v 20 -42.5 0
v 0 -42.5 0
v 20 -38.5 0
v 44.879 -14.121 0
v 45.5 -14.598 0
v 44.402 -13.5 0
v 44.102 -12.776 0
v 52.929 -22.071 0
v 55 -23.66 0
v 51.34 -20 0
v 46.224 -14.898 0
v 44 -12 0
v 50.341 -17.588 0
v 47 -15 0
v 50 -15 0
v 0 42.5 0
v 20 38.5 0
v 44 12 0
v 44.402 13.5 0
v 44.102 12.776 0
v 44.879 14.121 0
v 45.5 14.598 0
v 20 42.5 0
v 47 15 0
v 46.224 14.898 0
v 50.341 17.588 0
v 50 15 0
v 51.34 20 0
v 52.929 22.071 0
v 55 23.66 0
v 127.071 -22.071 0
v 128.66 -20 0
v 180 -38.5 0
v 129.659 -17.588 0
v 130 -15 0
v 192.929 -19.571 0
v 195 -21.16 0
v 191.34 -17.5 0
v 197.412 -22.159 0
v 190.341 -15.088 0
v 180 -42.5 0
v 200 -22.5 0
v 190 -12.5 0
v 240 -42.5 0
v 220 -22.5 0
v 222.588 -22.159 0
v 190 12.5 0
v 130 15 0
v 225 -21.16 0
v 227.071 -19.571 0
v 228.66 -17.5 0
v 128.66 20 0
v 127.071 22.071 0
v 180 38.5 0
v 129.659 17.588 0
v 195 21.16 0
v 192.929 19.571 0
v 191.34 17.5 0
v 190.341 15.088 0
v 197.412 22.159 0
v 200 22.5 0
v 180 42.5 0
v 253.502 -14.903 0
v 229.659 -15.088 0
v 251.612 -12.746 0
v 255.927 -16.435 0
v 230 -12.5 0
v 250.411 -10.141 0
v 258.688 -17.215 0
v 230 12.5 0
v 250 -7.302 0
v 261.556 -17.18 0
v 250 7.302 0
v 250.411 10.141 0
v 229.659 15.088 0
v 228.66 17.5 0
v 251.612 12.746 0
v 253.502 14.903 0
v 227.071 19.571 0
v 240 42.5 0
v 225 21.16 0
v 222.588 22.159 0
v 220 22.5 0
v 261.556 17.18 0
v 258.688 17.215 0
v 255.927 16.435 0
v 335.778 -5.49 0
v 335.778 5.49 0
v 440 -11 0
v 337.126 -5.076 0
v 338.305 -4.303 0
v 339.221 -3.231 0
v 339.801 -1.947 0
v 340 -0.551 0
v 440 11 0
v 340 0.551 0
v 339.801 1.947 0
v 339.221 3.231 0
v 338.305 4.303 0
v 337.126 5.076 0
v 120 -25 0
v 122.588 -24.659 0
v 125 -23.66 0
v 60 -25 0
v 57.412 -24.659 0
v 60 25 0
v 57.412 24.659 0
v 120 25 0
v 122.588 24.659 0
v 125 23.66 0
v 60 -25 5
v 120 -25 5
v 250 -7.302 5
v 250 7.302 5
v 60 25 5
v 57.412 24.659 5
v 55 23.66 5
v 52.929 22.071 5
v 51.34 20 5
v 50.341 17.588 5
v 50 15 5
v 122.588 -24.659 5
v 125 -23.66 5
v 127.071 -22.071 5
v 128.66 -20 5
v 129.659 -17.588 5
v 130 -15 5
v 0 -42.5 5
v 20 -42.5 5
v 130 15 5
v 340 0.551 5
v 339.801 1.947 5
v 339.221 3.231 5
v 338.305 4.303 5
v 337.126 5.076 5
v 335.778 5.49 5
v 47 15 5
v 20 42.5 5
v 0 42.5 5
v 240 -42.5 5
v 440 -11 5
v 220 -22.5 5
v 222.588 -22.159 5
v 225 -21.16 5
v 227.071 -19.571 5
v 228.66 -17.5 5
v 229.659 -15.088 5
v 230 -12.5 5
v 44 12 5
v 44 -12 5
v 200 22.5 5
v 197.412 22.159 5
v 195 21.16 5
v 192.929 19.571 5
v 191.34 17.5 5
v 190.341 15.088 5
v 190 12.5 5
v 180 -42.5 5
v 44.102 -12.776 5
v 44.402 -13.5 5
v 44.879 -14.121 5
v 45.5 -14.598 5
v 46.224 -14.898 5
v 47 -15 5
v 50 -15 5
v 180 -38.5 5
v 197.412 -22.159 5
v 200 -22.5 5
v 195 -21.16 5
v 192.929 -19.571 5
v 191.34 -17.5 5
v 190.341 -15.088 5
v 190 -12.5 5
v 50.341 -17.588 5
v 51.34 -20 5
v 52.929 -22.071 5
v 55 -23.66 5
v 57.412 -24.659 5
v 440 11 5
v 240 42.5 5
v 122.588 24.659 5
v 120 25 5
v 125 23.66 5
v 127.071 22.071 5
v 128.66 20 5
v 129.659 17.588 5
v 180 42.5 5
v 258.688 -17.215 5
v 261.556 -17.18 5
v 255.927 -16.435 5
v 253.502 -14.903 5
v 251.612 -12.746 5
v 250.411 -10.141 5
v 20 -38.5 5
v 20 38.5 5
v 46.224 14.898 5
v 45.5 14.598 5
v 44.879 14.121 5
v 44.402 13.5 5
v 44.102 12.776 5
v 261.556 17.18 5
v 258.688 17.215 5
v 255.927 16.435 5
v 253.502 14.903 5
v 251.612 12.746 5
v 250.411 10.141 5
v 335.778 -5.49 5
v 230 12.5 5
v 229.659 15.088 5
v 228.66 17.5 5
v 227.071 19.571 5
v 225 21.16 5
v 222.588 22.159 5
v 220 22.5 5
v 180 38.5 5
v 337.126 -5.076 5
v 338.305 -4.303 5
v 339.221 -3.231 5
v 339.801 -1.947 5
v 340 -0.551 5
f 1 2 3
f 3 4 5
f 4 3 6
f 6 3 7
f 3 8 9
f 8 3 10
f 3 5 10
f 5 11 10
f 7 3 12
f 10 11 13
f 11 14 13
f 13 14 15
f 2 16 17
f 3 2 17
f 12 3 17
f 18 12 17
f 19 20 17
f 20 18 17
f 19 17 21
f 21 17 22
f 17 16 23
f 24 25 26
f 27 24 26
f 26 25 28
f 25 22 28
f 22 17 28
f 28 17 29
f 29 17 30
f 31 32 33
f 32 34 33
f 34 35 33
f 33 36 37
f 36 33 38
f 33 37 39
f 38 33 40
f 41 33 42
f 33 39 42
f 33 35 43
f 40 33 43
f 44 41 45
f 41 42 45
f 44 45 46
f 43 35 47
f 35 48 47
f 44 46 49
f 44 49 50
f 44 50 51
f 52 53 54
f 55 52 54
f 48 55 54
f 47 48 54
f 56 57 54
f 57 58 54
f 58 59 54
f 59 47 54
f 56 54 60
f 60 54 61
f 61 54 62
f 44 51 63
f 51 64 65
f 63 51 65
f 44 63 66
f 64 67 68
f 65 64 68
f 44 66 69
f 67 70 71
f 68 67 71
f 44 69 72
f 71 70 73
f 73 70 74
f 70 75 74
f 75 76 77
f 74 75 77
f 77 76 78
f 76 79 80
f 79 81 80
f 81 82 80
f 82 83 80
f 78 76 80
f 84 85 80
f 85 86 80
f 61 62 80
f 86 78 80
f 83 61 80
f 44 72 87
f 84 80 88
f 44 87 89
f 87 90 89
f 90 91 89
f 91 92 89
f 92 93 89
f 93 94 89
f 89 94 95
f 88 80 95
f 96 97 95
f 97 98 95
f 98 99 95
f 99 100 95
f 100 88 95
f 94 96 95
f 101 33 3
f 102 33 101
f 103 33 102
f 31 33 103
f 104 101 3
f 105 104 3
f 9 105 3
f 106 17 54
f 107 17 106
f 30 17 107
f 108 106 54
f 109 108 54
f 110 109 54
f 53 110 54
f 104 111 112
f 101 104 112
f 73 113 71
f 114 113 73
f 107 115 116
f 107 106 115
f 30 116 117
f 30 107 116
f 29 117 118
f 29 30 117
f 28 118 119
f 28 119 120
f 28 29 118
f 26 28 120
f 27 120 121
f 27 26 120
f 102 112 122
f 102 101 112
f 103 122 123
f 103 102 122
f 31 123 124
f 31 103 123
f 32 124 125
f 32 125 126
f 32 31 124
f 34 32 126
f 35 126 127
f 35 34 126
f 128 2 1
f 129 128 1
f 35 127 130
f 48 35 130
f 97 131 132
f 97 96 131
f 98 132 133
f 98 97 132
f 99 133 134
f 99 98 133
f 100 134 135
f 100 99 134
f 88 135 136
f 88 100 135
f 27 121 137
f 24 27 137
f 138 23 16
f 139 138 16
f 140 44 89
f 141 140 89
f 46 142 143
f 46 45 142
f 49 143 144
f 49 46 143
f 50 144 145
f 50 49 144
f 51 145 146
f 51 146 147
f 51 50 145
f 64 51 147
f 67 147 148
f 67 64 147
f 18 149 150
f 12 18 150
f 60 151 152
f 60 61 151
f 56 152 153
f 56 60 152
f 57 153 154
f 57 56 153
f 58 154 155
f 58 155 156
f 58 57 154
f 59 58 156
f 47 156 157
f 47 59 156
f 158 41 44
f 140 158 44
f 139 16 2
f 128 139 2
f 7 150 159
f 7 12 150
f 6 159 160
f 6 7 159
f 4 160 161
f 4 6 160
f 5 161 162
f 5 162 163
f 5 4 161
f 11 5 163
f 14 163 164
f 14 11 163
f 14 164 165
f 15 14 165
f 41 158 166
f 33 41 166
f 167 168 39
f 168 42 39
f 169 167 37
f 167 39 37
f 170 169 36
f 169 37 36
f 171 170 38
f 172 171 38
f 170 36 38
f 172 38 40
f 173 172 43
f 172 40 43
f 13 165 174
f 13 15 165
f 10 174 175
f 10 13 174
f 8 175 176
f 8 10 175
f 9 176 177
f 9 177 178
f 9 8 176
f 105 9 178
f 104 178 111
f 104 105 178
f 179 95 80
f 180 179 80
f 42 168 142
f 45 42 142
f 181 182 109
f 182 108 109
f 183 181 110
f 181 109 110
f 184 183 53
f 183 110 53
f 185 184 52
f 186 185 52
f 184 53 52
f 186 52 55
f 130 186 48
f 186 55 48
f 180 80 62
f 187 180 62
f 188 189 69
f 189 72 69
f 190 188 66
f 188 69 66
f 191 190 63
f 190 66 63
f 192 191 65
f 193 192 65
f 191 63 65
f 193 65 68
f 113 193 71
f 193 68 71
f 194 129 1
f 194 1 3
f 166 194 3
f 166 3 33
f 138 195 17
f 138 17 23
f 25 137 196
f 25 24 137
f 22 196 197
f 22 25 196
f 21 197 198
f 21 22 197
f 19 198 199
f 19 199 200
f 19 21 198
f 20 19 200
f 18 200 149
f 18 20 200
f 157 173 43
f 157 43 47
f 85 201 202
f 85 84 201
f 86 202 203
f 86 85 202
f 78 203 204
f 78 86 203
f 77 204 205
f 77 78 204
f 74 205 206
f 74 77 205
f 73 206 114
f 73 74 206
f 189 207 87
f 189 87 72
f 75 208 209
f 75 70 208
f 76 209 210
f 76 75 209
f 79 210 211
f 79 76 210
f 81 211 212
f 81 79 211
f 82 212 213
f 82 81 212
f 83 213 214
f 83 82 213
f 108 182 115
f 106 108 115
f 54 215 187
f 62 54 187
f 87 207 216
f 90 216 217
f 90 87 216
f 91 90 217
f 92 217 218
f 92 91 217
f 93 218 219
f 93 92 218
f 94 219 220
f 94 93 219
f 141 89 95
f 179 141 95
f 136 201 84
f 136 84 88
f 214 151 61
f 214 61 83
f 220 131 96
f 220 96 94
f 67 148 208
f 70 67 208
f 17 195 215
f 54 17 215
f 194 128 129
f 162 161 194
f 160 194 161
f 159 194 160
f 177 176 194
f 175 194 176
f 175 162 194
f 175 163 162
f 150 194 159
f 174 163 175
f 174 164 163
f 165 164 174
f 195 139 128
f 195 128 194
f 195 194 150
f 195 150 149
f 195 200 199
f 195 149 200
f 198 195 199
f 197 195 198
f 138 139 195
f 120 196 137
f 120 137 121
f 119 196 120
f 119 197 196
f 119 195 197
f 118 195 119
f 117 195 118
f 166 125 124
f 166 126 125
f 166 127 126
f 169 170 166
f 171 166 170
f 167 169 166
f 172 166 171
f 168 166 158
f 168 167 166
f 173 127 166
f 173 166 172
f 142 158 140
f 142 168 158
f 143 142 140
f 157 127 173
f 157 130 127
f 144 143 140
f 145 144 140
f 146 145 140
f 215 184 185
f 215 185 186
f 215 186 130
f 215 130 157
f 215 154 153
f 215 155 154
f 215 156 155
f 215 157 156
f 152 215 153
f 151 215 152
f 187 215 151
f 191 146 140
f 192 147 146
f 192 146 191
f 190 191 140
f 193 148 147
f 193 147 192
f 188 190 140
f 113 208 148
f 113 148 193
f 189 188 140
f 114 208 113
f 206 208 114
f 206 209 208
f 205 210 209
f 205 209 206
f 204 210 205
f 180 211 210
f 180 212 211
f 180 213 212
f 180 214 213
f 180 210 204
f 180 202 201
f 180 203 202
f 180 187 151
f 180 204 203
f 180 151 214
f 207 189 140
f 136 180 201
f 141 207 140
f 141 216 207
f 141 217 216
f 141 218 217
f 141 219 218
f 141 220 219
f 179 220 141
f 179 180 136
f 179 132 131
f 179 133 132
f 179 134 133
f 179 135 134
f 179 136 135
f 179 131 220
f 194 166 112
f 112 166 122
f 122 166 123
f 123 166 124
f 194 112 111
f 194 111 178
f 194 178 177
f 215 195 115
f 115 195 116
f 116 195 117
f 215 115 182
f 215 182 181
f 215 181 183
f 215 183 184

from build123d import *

# Parameters (mm, degrees)
GRUNDPLATTE_DEPTH                  = 5
SCHNITT_LINEAR_AUSTRAGEN1_DEPTH    = 443.076068115
VERRUNDUNG1_R                      = 10
SKIZZE3_W                          = 160
SKIZZE3_H                          = 4
AUSSCHNITT_FL_CHENAUFDOPPLER_DEPTH = 443.076068115
SKIZZE4_W                          = 40
SKIZZE4_H                          = 45
AUSSCHNITT_GEWICHT_DEPTH           = 443.076068115
VERRUNDUNG2_R                      = 10
VERRUNDUNG3_R                      = 5
VERRUNDUNG4_R                      = 3


with BuildPart() as part:
    # Skizze1 → Grundplatte (new body)
    with BuildSketch(Plane.XY):
        Polygon((0, 42.5), (0, -42.5), (240, -42.5), (440, -11), (440, 11), (240, 42.5), align=None)
    extrude(amount=GRUNDPLATTE_DEPTH)

    # Skizze2 → Schnitt-Linear austragen1 (cut, through all)
    with BuildSketch(Plane.XY.offset(5)):
        Polygon((130, 25), (50, 25), (50, 15), (44, 15), (44, -15), (50, -15), (50, -25), (130, -25), align=None)
    extrude(amount=-SCHNITT_LINEAR_AUSTRAGEN1_DEPTH, mode=Mode.SUBTRACT)

    # Verrundung1
    verrundung1_edges = [part.edges().sort_by_distance(p)[0] for p in [
        (130, 25, 2.5),
        (130, -25, 2.5),
        (50, 25, 2.5),
        (50, -25, 2.5),
    ]]
    fillet(verrundung1_edges, radius=VERRUNDUNG1_R - 0.0001)  # a hair under: the kernel refuses the full size

    # Skizze3 → Ausschnitt_Flächenaufdoppler (cut, through all)
    with BuildSketch(Plane.XY.offset(5)):
        with Locations((100, 40.5)):
            Rectangle(SKIZZE3_W, SKIZZE3_H)
        with Locations((100, -40.5)):
            Rectangle(SKIZZE3_W, SKIZZE3_H)
    extrude(amount=-AUSSCHNITT_FL_CHENAUFDOPPLER_DEPTH, mode=Mode.SUBTRACT)

    # Skizze4 → Ausschnitt Gewicht (cut, through all)
    with BuildSketch(Plane.XY.offset(5)):
        with Locations((210, 0)):
            Rectangle(SKIZZE4_W, SKIZZE4_H)
        Polygon((250, -19), (250, 19), (340, 4.825), (340, -4.825), align=None)
    extrude(amount=-AUSSCHNITT_GEWICHT_DEPTH, mode=Mode.SUBTRACT)

    # Verrundung2
    verrundung2_edges = [part.edges().sort_by_distance(p)[0] for p in [
        (190, 22.5, 2.5),
        (230, 22.5, 2.5),
        (230, -22.5, 2.5),
        (190, -22.5, 2.5),
        (250, -19, 2.5),
        (250, 19, 2.5),
    ]]
    fillet(verrundung2_edges, radius=VERRUNDUNG2_R)

    # Verrundung3
    verrundung3_edges = [part.edges().sort_by_distance(p)[0] for p in [
        (340, -4.825, 2.5),
        (340, 4.825, 2.5),
    ]]
    fillet(verrundung3_edges, radius=VERRUNDUNG3_R)

    # Verrundung4
    verrundung4_edges = [part.edges().sort_by_distance(p)[0] for p in [
        (44, -15, 2.5),
        (44, 15, 2.5),
    ]]
    fillet(verrundung4_edges, radius=VERRUNDUNG4_R)


solid = part.part
